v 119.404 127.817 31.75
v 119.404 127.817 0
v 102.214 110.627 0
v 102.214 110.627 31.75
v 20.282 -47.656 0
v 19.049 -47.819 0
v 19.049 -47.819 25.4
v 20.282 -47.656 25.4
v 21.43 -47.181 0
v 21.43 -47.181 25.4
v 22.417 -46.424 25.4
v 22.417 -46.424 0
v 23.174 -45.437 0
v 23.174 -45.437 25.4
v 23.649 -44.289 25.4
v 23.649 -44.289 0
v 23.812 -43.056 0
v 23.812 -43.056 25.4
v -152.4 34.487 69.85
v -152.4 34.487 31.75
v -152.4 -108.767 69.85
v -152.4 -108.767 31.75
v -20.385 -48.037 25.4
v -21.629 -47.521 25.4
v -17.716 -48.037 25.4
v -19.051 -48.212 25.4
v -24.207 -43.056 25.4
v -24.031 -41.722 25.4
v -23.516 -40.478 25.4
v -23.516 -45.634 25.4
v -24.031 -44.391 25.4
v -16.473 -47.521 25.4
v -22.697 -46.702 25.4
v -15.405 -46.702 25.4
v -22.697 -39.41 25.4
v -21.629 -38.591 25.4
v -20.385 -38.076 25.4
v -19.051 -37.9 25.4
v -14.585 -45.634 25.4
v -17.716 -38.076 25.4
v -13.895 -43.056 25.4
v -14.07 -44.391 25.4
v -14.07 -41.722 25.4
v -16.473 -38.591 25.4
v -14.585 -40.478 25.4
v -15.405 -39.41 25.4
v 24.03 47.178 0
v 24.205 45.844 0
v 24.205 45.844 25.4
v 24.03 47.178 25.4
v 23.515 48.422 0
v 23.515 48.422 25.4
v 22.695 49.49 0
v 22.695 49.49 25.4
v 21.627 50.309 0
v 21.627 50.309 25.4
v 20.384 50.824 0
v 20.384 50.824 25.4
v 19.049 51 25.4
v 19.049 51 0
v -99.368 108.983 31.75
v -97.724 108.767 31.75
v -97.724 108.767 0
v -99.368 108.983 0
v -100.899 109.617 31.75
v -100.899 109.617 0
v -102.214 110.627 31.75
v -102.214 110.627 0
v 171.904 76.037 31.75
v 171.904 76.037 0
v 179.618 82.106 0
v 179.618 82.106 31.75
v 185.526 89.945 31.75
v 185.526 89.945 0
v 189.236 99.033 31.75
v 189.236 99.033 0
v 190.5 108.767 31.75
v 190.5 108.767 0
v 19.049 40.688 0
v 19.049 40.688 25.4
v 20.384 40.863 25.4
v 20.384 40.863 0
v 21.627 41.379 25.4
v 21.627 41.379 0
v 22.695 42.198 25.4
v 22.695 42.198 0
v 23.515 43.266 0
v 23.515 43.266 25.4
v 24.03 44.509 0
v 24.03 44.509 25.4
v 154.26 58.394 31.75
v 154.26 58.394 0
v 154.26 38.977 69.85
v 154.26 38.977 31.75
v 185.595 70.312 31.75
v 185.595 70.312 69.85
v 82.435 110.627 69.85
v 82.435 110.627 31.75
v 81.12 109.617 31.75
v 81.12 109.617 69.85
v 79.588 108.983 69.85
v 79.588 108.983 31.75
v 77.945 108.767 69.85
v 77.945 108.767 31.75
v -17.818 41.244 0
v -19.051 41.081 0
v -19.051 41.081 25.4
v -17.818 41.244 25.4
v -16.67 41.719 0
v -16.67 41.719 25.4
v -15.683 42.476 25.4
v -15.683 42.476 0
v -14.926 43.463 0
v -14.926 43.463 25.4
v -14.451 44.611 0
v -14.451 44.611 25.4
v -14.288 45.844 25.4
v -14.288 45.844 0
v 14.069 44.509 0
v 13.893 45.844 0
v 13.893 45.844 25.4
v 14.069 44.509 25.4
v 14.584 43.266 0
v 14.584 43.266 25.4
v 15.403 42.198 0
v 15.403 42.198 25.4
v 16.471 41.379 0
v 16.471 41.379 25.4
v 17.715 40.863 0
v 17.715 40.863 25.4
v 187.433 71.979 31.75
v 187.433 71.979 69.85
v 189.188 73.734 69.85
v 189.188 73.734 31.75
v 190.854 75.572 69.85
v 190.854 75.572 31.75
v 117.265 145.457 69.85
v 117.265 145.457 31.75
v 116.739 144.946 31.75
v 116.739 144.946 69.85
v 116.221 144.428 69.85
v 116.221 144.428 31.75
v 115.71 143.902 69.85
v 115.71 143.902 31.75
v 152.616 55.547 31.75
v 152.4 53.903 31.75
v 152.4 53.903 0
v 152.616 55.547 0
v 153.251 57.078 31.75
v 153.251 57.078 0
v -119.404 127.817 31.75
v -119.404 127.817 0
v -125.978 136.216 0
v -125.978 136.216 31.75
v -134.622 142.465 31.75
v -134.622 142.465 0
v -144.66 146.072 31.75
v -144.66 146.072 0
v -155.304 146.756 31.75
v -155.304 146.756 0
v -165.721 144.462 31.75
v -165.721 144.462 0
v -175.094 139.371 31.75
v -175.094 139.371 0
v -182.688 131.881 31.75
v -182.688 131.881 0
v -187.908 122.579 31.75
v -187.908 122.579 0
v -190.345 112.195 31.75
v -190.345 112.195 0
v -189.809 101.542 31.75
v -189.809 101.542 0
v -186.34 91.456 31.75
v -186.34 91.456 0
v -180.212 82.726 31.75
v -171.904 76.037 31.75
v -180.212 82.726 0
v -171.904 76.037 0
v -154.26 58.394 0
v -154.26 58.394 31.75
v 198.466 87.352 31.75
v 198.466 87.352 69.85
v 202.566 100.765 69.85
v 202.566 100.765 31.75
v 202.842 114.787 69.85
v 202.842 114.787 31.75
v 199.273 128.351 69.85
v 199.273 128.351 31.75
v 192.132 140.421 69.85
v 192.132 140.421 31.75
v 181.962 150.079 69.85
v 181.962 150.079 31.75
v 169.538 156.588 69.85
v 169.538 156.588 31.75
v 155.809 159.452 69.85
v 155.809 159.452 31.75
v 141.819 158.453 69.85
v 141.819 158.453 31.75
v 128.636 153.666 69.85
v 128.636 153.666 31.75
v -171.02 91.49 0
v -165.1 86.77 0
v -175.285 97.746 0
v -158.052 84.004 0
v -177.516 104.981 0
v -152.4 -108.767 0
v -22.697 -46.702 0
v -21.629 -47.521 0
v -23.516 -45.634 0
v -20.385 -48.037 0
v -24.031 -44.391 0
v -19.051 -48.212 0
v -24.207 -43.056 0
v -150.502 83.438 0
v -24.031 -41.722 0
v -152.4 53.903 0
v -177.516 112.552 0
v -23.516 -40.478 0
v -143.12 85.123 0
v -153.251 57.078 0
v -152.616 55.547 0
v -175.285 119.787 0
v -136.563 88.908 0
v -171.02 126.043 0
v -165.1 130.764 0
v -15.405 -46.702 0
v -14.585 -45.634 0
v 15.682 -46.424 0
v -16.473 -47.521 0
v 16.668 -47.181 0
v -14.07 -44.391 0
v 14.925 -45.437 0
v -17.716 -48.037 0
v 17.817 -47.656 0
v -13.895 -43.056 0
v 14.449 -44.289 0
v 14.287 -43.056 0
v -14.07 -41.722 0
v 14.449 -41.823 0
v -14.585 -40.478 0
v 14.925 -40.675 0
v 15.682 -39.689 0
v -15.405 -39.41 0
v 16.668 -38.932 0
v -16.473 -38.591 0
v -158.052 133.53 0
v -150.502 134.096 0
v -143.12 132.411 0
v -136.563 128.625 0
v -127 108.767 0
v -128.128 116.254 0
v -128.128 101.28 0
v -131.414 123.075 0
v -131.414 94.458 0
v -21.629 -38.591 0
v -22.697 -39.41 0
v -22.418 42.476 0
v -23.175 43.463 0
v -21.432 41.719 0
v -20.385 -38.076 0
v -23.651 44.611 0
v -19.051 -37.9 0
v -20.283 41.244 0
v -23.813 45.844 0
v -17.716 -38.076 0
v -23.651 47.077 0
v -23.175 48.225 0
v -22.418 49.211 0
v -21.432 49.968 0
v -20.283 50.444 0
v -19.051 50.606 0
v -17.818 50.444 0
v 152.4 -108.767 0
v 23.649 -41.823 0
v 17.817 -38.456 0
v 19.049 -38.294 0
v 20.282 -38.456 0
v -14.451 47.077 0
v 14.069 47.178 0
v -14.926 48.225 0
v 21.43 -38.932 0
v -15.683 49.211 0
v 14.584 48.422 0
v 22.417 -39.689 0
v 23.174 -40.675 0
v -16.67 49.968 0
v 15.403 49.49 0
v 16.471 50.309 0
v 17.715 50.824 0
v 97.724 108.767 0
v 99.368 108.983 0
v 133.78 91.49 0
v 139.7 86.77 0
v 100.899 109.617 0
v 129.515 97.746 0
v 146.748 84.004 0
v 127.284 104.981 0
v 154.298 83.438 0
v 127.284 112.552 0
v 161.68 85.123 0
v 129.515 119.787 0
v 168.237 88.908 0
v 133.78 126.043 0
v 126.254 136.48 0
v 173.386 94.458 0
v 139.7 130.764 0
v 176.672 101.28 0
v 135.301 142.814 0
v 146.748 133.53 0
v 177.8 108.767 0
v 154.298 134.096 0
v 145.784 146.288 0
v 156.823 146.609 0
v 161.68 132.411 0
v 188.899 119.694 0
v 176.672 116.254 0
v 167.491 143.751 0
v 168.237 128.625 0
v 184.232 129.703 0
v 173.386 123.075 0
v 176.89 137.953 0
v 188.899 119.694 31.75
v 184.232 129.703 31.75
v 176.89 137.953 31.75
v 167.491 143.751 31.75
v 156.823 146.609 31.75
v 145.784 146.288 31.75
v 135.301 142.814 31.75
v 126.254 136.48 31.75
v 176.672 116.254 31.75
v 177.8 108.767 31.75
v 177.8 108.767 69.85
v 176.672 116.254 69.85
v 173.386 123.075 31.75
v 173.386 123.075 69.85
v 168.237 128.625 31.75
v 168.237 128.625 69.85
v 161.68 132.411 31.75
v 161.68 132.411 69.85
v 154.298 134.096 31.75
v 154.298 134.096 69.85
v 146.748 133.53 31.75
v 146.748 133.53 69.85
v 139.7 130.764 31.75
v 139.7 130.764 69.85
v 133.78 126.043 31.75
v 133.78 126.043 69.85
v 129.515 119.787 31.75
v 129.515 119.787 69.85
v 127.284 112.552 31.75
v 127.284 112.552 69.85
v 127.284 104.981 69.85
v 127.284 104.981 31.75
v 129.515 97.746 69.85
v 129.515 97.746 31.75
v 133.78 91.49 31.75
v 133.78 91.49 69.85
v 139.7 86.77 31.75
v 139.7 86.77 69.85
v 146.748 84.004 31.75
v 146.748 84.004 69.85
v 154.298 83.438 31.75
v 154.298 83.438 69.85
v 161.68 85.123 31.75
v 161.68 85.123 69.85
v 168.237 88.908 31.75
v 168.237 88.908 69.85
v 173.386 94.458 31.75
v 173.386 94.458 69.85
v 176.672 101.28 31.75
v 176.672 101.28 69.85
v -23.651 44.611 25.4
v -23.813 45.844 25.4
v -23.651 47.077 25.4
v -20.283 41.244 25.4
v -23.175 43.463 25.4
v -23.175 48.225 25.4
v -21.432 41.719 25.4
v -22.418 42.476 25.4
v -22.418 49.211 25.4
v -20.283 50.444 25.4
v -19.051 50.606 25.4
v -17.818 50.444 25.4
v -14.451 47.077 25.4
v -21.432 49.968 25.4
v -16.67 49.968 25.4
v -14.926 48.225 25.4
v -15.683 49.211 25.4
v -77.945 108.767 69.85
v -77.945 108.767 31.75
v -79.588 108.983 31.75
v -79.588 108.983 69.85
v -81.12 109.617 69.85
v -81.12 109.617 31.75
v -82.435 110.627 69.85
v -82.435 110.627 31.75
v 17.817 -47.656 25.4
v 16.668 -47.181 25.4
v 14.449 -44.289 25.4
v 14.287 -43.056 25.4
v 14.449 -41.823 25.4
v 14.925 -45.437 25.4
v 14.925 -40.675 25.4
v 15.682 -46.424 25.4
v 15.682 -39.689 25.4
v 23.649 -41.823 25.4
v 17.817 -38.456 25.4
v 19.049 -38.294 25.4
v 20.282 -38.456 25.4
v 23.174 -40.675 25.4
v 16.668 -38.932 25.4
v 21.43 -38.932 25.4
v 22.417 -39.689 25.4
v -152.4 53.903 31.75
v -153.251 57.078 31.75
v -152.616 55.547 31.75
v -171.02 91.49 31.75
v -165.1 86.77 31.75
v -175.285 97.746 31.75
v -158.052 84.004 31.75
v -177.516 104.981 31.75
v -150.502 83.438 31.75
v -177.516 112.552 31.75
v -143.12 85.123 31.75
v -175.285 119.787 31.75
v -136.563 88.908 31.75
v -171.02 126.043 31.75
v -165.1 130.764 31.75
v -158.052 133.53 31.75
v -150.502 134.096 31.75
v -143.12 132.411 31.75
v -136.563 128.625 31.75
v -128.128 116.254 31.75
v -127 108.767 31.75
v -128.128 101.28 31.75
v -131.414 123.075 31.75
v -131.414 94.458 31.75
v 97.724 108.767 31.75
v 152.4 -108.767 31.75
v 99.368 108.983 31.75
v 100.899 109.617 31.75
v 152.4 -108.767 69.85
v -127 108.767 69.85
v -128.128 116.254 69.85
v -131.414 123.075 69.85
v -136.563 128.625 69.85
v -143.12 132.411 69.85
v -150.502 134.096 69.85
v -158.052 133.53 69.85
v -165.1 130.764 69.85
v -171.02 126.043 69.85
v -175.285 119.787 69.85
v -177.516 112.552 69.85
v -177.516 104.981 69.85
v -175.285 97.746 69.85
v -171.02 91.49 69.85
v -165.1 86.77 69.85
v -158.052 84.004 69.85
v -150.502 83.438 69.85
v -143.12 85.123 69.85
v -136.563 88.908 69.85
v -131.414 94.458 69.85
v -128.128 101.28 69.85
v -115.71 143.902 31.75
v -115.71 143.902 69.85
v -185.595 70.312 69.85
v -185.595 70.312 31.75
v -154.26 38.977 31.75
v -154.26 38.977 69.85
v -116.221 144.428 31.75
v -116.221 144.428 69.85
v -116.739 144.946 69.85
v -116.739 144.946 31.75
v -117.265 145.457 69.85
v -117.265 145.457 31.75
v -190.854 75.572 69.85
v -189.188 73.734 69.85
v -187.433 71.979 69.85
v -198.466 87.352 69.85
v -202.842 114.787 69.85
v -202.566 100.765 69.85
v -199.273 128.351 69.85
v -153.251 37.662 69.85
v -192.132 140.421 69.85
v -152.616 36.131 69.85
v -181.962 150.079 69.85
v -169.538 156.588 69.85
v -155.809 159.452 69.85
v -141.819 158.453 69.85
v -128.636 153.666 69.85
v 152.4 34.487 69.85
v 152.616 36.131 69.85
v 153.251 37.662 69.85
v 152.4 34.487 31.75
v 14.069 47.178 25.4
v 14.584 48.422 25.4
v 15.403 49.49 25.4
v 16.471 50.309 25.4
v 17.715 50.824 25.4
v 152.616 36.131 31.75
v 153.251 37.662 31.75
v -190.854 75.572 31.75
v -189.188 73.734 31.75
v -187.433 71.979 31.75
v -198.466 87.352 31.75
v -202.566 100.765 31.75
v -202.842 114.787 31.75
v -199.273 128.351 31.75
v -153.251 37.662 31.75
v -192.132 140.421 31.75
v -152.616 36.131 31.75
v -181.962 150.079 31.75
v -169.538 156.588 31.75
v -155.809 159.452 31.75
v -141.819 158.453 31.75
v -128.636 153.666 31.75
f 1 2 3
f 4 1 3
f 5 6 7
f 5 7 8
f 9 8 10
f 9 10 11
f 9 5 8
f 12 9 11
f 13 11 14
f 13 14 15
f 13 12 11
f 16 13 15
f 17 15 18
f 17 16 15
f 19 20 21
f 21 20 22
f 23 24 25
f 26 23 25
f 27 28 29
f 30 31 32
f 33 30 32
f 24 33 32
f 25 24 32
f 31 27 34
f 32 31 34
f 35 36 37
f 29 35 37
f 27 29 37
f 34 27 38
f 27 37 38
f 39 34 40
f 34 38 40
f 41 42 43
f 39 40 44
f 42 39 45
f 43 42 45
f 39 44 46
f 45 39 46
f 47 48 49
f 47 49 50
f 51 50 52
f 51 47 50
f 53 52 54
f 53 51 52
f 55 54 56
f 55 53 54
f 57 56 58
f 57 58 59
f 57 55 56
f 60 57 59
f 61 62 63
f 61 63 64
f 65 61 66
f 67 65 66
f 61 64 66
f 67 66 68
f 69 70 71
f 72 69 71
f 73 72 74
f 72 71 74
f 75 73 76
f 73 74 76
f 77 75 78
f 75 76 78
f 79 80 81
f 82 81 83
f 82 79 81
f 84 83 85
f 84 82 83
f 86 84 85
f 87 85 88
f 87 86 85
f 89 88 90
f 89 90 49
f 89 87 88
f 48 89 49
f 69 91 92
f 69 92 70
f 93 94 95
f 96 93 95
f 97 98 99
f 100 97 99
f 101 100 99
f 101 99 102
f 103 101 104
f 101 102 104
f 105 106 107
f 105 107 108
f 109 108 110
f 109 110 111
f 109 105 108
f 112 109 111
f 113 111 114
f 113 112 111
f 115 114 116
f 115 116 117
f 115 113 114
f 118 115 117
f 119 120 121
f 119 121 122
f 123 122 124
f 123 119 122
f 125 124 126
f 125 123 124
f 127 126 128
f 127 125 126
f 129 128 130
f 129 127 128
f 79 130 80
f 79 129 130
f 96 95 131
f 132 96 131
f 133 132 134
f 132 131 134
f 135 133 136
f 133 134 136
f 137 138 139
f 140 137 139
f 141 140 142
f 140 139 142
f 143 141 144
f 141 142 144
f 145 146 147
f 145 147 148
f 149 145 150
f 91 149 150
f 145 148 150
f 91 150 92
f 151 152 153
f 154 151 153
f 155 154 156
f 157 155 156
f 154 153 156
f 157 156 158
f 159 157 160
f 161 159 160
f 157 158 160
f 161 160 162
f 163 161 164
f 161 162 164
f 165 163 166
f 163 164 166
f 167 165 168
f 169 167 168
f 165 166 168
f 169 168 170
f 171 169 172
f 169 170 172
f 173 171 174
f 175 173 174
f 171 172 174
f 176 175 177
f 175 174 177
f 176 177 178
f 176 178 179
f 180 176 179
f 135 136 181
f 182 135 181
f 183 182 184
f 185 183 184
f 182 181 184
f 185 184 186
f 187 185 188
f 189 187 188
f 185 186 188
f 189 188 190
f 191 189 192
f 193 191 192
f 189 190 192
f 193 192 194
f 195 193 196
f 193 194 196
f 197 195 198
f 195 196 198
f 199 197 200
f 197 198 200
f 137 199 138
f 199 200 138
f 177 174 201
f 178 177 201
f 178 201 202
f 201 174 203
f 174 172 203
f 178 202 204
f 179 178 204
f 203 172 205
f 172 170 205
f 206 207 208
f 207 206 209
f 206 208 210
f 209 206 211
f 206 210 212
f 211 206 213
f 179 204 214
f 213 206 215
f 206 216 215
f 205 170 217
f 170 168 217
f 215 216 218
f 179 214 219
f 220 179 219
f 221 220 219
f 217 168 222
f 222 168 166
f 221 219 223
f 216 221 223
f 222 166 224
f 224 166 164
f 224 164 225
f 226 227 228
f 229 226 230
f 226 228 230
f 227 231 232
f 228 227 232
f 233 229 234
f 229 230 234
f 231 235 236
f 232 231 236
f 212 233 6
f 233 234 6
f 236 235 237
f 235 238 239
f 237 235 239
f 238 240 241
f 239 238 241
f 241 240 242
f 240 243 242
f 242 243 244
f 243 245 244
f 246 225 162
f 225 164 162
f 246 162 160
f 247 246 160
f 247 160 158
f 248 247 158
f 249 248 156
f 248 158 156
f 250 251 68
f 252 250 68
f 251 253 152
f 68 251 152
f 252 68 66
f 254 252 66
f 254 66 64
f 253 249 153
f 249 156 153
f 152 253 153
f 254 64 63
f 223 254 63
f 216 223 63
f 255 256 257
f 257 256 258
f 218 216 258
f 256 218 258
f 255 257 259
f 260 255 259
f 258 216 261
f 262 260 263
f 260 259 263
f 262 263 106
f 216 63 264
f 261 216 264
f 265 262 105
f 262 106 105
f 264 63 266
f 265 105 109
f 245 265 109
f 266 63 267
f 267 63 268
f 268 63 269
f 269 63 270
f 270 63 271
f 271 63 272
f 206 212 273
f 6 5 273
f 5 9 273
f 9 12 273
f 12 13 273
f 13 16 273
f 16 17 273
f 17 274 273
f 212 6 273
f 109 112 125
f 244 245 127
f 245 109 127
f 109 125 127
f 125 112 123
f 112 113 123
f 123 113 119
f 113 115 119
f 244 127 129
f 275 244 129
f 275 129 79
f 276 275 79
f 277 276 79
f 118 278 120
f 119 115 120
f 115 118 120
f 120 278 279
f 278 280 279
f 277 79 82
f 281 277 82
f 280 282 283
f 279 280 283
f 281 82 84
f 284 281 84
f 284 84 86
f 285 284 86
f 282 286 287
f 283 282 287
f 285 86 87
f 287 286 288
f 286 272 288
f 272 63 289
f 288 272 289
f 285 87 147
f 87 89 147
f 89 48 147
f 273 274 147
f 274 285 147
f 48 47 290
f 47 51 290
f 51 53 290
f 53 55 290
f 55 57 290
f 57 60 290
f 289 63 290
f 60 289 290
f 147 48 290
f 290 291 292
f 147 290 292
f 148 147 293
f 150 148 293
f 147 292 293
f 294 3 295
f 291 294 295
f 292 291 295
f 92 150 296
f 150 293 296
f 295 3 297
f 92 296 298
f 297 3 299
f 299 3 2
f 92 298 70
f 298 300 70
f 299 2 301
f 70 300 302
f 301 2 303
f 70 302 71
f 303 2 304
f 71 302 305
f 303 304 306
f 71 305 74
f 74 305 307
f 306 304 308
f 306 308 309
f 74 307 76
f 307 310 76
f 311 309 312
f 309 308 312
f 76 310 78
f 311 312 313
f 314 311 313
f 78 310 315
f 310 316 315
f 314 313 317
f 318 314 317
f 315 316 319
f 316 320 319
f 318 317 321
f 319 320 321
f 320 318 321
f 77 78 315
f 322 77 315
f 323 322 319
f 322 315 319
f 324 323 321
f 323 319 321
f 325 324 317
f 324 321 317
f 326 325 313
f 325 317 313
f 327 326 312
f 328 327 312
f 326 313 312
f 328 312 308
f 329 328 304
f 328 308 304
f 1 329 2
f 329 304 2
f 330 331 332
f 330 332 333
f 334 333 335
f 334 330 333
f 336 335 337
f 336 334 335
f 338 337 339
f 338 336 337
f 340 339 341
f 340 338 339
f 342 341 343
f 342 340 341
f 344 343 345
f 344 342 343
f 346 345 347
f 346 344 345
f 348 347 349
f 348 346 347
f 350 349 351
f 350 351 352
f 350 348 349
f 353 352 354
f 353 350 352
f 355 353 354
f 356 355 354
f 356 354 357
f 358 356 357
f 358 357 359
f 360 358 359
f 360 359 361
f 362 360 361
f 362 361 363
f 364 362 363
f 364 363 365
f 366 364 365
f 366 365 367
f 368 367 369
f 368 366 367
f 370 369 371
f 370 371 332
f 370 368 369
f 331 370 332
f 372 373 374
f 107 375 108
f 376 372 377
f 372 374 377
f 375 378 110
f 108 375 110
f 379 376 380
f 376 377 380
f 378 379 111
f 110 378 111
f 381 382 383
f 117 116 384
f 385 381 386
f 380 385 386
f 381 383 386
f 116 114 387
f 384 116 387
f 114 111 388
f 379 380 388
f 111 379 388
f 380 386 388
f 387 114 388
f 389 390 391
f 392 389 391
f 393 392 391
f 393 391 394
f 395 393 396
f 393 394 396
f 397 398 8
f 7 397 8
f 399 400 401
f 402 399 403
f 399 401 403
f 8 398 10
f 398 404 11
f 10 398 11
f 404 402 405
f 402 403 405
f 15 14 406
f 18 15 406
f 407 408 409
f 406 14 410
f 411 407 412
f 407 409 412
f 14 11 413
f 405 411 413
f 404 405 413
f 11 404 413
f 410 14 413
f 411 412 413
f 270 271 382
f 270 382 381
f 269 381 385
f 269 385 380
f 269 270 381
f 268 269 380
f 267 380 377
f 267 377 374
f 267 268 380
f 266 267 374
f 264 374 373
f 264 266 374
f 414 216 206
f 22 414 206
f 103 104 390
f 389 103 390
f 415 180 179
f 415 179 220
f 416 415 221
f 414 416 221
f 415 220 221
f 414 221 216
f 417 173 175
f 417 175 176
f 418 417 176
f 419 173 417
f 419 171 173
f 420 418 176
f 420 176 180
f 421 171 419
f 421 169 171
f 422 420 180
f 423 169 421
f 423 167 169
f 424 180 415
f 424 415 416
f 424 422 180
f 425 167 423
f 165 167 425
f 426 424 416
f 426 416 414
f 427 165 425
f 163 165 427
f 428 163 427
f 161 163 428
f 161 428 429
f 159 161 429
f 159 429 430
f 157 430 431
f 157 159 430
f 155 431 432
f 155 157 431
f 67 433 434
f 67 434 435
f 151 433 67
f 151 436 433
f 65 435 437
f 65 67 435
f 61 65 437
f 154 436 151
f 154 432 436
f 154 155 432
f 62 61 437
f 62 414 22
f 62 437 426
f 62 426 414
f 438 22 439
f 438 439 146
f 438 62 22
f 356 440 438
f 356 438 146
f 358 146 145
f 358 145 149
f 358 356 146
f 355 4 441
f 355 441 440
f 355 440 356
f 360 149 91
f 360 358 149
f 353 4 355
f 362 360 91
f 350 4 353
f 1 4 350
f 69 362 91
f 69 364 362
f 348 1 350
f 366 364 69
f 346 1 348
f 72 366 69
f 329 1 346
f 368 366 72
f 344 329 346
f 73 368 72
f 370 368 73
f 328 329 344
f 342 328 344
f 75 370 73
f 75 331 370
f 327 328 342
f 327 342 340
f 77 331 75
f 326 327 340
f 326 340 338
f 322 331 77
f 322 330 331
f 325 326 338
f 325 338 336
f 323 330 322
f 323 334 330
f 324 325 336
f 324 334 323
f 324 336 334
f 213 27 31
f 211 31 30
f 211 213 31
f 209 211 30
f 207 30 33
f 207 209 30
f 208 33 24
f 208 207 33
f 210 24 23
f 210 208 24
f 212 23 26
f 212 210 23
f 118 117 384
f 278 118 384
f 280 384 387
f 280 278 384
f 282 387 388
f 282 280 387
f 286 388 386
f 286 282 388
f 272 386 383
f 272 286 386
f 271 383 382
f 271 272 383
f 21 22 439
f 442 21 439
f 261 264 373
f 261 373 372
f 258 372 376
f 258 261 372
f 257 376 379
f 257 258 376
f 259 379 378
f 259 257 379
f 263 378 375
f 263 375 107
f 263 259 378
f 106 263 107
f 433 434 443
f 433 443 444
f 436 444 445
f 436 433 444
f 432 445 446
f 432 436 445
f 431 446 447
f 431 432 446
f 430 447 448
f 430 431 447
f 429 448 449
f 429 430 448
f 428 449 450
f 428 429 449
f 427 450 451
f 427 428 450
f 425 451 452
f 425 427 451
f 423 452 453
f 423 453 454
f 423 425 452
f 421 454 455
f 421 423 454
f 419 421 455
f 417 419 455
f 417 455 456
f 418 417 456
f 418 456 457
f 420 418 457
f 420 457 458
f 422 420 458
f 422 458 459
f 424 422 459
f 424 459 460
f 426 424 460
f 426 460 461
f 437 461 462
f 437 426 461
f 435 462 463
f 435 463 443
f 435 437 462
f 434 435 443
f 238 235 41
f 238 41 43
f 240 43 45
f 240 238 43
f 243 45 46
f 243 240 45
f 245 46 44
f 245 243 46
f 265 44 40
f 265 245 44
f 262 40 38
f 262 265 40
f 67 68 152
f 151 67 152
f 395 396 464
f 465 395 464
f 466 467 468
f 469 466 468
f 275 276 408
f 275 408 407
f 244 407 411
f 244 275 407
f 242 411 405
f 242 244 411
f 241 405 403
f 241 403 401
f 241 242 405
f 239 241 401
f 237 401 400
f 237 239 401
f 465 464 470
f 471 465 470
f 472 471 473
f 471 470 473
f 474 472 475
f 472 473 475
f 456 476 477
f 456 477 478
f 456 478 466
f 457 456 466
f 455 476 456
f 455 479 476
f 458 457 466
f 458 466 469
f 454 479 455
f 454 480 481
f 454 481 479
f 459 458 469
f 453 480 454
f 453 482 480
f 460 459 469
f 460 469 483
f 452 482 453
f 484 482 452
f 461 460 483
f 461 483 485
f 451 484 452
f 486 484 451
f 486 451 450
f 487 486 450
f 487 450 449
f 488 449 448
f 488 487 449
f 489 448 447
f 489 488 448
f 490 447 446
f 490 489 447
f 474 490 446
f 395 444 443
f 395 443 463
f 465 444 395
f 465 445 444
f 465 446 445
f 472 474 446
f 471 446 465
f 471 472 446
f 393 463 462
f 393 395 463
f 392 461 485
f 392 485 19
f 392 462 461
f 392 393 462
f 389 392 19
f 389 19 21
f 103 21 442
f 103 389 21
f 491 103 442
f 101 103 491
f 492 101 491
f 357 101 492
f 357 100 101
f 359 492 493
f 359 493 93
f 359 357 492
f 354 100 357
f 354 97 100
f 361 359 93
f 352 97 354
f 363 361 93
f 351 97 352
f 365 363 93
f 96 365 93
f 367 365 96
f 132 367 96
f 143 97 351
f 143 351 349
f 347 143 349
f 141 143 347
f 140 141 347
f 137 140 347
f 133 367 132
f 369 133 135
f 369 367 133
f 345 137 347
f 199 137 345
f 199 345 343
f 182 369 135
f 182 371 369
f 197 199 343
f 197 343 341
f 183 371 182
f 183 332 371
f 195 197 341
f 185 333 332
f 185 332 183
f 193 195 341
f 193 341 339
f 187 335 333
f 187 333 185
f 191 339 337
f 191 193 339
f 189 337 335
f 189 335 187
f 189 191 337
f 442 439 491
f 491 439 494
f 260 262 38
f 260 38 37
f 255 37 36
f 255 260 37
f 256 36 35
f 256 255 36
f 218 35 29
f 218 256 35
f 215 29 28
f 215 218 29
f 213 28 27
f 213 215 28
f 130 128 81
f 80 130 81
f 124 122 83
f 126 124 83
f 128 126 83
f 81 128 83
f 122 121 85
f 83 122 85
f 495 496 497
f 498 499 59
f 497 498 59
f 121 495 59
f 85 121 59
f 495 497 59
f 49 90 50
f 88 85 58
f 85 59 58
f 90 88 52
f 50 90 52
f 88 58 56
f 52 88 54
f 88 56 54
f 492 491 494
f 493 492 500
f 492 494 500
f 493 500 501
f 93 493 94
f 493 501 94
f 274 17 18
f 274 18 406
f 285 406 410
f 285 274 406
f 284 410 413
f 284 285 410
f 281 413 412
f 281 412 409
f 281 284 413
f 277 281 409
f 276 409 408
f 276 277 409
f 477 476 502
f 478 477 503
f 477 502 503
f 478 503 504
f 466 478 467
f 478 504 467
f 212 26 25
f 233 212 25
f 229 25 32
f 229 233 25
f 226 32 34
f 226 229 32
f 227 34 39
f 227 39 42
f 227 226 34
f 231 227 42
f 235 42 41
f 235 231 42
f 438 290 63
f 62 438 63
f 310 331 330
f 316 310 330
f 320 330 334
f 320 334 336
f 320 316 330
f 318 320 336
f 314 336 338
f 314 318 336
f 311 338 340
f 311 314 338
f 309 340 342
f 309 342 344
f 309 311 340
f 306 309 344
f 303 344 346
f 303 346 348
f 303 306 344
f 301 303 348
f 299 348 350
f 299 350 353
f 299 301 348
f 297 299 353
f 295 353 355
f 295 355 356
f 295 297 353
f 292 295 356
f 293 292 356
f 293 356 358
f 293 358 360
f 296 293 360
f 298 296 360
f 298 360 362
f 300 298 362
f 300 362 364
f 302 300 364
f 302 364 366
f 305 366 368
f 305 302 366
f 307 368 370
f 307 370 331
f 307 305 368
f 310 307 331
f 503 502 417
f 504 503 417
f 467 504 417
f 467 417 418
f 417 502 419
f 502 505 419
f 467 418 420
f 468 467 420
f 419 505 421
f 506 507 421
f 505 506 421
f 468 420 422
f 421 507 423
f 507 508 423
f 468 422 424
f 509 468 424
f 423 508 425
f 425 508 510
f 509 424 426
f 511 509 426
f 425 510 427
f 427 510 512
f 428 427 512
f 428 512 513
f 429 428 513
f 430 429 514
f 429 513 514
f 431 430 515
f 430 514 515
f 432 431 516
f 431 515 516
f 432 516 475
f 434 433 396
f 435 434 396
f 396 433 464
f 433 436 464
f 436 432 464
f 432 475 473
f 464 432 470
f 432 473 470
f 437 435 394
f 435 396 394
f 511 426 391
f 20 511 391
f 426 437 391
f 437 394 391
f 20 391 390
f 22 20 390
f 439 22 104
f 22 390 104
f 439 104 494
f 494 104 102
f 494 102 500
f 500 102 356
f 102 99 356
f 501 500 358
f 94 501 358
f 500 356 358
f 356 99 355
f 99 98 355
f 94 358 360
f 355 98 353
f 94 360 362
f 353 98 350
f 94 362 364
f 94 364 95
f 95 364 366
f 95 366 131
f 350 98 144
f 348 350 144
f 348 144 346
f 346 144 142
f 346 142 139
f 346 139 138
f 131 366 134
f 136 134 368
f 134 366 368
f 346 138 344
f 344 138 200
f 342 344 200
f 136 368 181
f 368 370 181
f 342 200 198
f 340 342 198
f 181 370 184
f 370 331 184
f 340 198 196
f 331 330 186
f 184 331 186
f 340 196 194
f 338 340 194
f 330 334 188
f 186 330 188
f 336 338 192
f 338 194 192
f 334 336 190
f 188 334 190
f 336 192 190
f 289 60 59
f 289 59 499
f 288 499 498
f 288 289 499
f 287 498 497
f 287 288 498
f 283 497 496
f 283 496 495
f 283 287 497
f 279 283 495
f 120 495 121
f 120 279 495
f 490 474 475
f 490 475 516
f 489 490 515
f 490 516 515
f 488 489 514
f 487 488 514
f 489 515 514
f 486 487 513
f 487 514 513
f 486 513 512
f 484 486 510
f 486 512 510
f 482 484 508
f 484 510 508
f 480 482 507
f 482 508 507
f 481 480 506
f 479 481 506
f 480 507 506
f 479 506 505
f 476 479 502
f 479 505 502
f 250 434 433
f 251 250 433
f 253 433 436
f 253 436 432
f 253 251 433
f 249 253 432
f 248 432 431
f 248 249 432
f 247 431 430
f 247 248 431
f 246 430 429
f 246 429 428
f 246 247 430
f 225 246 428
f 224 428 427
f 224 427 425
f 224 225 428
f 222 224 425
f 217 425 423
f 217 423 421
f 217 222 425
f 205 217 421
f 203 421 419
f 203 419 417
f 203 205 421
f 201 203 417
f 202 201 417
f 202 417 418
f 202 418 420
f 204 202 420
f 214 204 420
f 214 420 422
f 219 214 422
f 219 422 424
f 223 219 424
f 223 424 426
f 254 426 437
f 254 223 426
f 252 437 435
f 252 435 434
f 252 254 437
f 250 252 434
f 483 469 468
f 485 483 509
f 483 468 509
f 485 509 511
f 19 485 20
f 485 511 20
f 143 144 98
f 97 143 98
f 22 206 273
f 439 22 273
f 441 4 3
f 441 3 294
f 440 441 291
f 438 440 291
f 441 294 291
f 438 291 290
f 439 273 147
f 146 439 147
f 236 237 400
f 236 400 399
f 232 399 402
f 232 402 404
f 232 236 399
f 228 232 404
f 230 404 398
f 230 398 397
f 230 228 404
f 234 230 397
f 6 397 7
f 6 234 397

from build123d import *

# Parameters (mm, degrees)
F0_R     = 25.4
F1_DEPTH = 31.75
F4_R     = 25.4
F5_DEPTH = 38.1
F7_DEPTH = 25.4


with BuildPart() as f1:
    # F0 (on Top) → F1 (new body)
    with BuildSketch(Plane.XY):
        with BuildLine():
            Line((-152.4, 53.9033839703), (-152.4, -108.7667216295))
            Line((-152.4, -108.7667216295), (152.4, -108.7667216295))
            Line((152.4, -108.7667216295), (152.4, 53.9033839703))
            ThreePointArc((152.4, 53.9033839703), (152.8833649686, 56.3334237658), (154.2598719395, 58.3935120309))
            Line((154.2598719395, 58.3935120309), (171.9035763614, 76.0372164528))
            ThreePointArc((171.9035763614, 76.0372164528), (125.6457900901, 81.6406778321), (119.4044321158, 127.8167216295))
            Line((119.4044321158, 127.8167216295), (102.2143040553, 110.626593569))
            ThreePointArc((102.2143040553, 110.626593569), (100.1542157903, 109.2500865981), (97.7241759947, 108.7667216295))
            Line((97.7241759947, 108.7667216295), (-97.7241759947, 108.7667216295))
            ThreePointArc((-97.7241759947, 108.7667216295), (-100.1542157903, 109.2500865981), (-102.2143040553, 110.626593569))
            Line((-102.2143040553, 110.626593569), (-119.4044321158, 127.8167216295))
            ThreePointArc((-119.4044321158, 127.8167216295), (-115.5982260184, 118.6277272479), (-114.3, 108.7667216295))
            ThreePointArc((-114.3, 108.7667216295), (-125.4592316368, 81.8259532663), (-152.4, 70.6667216295))
            Line((-152.4, 70.6667216295), (-152.4, 53.9033839703))
        make_face()
        with BuildLine():
            ThreePointArc((-171.9035763614, 76.0372164528), (-162.5147380778, 72.0338742907), (-152.4, 70.6667216295))
            ThreePointArc((-152.4, 70.6667216295), (-125.4592316368, 81.8259532663), (-114.3, 108.7667216295))
            ThreePointArc((-114.3, 108.7667216295), (-115.5982260184, 118.6277272479), (-119.4044321158, 127.8167216295))
            ThreePointArc((-119.4044321158, 127.8167216295), (-179.1542099099, 135.8927654269), (-171.9035763614, 76.0372164528))
        make_face()
        with Locations((-152.4, 108.7667216295)):
            Circle(F0_R, mode=Mode.SUBTRACT)
        with BuildLine():
            ThreePointArc((119.4044321158, 127.8167216295), (125.6457900901, 81.6406778321), (171.9035763614, 76.0372164528))
            ThreePointArc((171.9035763614, 76.0372164528), (185.5262453303, 89.9448760687), (190.5, 108.7667216295))
            ThreePointArc((190.5, 108.7667216295), (162.2610056184, 145.5684956111), (119.4044321158, 127.8167216295))
        make_face()
        with Locations((152.4, 108.7667216295)):
            Circle(F0_R, mode=Mode.SUBTRACT)
        with BuildLine():
            ThreePointArc((-154.2598719395, 58.3935120309), (-152.8833649686, 56.3334237658), (-152.4, 53.9033839703))
            Line((-152.4, 53.9033839703), (-152.4, 70.6667216295))
            ThreePointArc((-152.4, 70.6667216295), (-162.5147380778, 72.0338742907), (-171.9035763614, 76.0372164528))
            Line((-171.9035763614, 76.0372164528), (-154.2598719395, 58.3935120309))
        make_face()
    extrude(amount=F1_DEPTH)


with BuildPart() as f2_1:
    # F2: copy of F1
    add(f1.part)


with BuildPart() as f5:
    # F4 (on face) → F5 (new body)
    with BuildSketch(Plane.XY.offset(31.75)):
        with BuildLine():
            Line((-152.4, -108.7667216295), (152.4, -108.7667216295))
            Line((152.4, -108.7667216295), (152.4, 34.487204177))
            ThreePointArc((152.4, 34.487204177), (152.8833649686, 36.9172439725), (154.2598719395, 38.9773322375))
            Line((154.2598719395, 38.9773322375), (185.5948326386, 70.3122929367))
            Line((185.5948326386, 70.3122929367), (190.8544286929, 75.5718889909))
            ThreePointArc((190.8544286929, 75.5718889909), (187.3817017696, 145.6031240231), (117.2645696221, 145.4565231029))
            Line((117.2645696221, 145.4565231029), (115.7101985266, 143.9021520075))
            Line((115.7101985266, 143.9021520075), (82.4346400881, 110.626593569))
            ThreePointArc((82.4346400881, 110.626593569), (80.3745518231, 109.2500865981), (77.9445120276, 108.7667216295))
            Line((77.9445120276, 108.7667216295), (-77.9445120276, 108.7667216295))
            ThreePointArc((-77.9445120276, 108.7667216295), (-80.3745518231, 109.2500865981), (-82.4346400881, 110.626593569))
            Line((-82.4346400881, 110.626593569), (-115.7101985266, 143.9021520075))
            Line((-115.7101985266, 143.9021520075), (-117.2645696221, 145.4565231029))
            ThreePointArc((-117.2645696221, 145.4565231029), (-187.3817017696, 145.6031240231), (-190.8544286929, 75.5718889909))
            Line((-190.8544286929, 75.5718889909), (-185.5948326386, 70.3122929367))
            Line((-185.5948326386, 70.3122929367), (-154.2598719395, 38.9773322375))
            ThreePointArc((-154.2598719395, 38.9773322375), (-152.8833649686, 36.9172439725), (-152.4, 34.487204177))
            Line((-152.4, 34.487204177), (-152.4, -108.7667216295))
        make_face()
        with Locations((-152.4, 108.7667216295)):
            Circle(F4_R, mode=Mode.SUBTRACT)
        with Locations((152.4, 108.7667216295)):
            Circle(F4_R, mode=Mode.SUBTRACT)
        with BuildLine():
            Line((190.8544286929, 75.5718889909), (185.5948326386, 70.3122929367))
            ThreePointArc((185.5948326386, 70.3122929367), (188.3210244843, 72.8456971453), (190.8544286929, 75.5718889909))
        make_face()
        with BuildLine():
            ThreePointArc((-190.8544286929, 75.5718889909), (-188.3210244843, 72.8456971453), (-185.5948326386, 70.3122929367))
            Line((-185.5948326386, 70.3122929367), (-190.8544286929, 75.5718889909))
        make_face()
        with BuildLine():
            Line((115.7101985266, 143.9021520075), (117.2645696221, 145.4565231029))
            ThreePointArc((117.2645696221, 145.4565231029), (116.4789755157, 144.6877461138), (115.7101985266, 143.9021520075))
        make_face()
        with BuildLine():
            ThreePointArc((-115.7101985266, 143.9021520075), (-116.4789755157, 144.6877461138), (-117.2645696221, 145.4565231029))
            Line((-117.2645696221, 145.4565231029), (-115.7101985266, 143.9021520075))
        make_face()
    extrude(amount=F5_DEPTH)


with BuildPart() as f1_1:
    add(f1.part)

    # F6 (on Top) → F7 (cut)
    with BuildSketch(Plane.XY):
        with BuildLine():
            ThreePointArc((-19.050831298, -48.2122973633), (-15.4048473129, -46.7020813484), (-13.894631298, -43.0560973633))
            Line((-13.894631298, -43.0560973633), (-19.050831298, -43.0560973633))
            Line((-19.050831298, -43.0560973633), (-19.050831298, -48.2122973633))
        make_face()
        with BuildLine():
            ThreePointArc((-24.207031298, -43.0560973633), (-22.6968152832, -46.7020813484), (-19.050831298, -48.2122973633))
            Line((-19.050831298, -48.2122973633), (-19.050831298, -43.0560973633))
            Line((-19.050831298, -43.0560973633), (-24.207031298, -43.0560973633))
        make_face()
        with BuildLine():
            Line((-24.207031298, -43.0560973633), (-19.050831298, -43.0560973633))
            Line((-19.050831298, -43.0560973633), (-19.050831298, -37.8998973633))
            ThreePointArc((-19.050831298, -37.8998973633), (-22.6968152832, -39.4101133781), (-24.207031298, -43.0560973633))
        make_face()
        with BuildLine():
            Line((-19.050831298, -43.0560973633), (-13.894631298, -43.0560973633))
            ThreePointArc((-13.894631298, -43.0560973633), (-15.4048473129, -39.4101133781), (-19.050831298, -37.8998973633))
            Line((-19.050831298, -37.8998973633), (-19.050831298, -43.0560973633))
        make_face()
        with BuildLine():
            ThreePointArc((19.049168702, -47.8185973633), (22.4167647474, -46.4236934087), (23.811668702, -43.0560973633))
            Line((23.811668702, -43.0560973633), (19.049168702, -43.0560973633))
            Line((19.049168702, -43.0560973633), (19.049168702, -47.8185973633))
        make_face()
        with BuildLine():
            Line((19.049168702, -47.8185973633), (19.049168702, -43.0560973633))
            Line((19.049168702, -43.0560973633), (14.286668702, -43.0560973633))
            ThreePointArc((14.286668702, -43.0560973633), (15.6815726566, -46.4236934087), (19.049168702, -47.8185973633))
        make_face()
        with BuildLine():
            Line((14.286668702, -43.0560973633), (19.049168702, -43.0560973633))
            Line((19.049168702, -43.0560973633), (19.049168702, -38.2935973633))
            ThreePointArc((19.049168702, -38.2935973633), (15.6815726566, -39.6885013179), (14.286668702, -43.0560973633))
        make_face()
        with BuildLine():
            Line((19.049168702, -43.0560973633), (23.811668702, -43.0560973633))
            ThreePointArc((23.811668702, -43.0560973633), (22.4167647474, -39.6885013179), (19.049168702, -38.2935973633))
            Line((19.049168702, -38.2935973633), (19.049168702, -43.0560973633))
        make_face()
        with BuildLine():
            Line((19.049168702, 40.6877026367), (19.049168702, 45.8439026367))
            Line((19.049168702, 45.8439026367), (13.892968702, 45.8439026367))
            ThreePointArc((13.892968702, 45.8439026367), (15.4031847168, 42.1979186516), (19.049168702, 40.6877026367))
        make_face()
        with BuildLine():
            Line((19.049168702, 45.8439026367), (19.049168702, 51.0001026367))
            ThreePointArc((19.049168702, 51.0001026367), (15.4031847168, 49.4898866219), (13.892968702, 45.8439026367))
            Line((13.892968702, 45.8439026367), (19.049168702, 45.8439026367))
        make_face()
        with BuildLine():
            Line((19.049168702, 45.8439026367), (24.205368702, 45.8439026367))
            ThreePointArc((24.205368702, 45.8439026367), (22.6951526871, 49.4898866219), (19.049168702, 51.0001026367))
            Line((19.049168702, 51.0001026367), (19.049168702, 45.8439026367))
        make_face()
        with BuildLine():
            ThreePointArc((19.049168702, 40.6877026367), (22.6951526871, 42.1979186516), (24.205368702, 45.8439026367))
            Line((24.205368702, 45.8439026367), (19.049168702, 45.8439026367))
            Line((19.049168702, 45.8439026367), (19.049168702, 40.6877026367))
        make_face()
        with BuildLine():
            Line((-14.288331298, 45.8439026367), (-19.050831298, 45.8439026367))
            Line((-19.050831298, 45.8439026367), (-19.050831298, 41.0814026367))
            ThreePointArc((-19.050831298, 41.0814026367), (-15.6832352526, 42.4763065913), (-14.288331298, 45.8439026367))
        make_face()
        with BuildLine():
            ThreePointArc((-14.288331298, 45.8439026367), (-15.6832352526, 49.2114986821), (-19.050831298, 50.6064026367))
            Line((-19.050831298, 50.6064026367), (-19.050831298, 45.8439026367))
            Line((-19.050831298, 45.8439026367), (-14.288331298, 45.8439026367))
        make_face()
        with BuildLine():
            Line((-19.050831298, 45.8439026367), (-19.050831298, 50.6064026367))
            ThreePointArc((-19.050831298, 50.6064026367), (-22.4184273434, 49.2114986821), (-23.813331298, 45.8439026367))
            Line((-23.813331298, 45.8439026367), (-19.050831298, 45.8439026367))
        make_face()
        with BuildLine():
            Line((-19.050831298, 41.0814026367), (-19.050831298, 45.8439026367))
            Line((-19.050831298, 45.8439026367), (-23.813331298, 45.8439026367))
            ThreePointArc((-23.813331298, 45.8439026367), (-22.4184273434, 42.4763065913), (-19.050831298, 41.0814026367))
        make_face()
    extrude(amount=F7_DEPTH, mode=Mode.SUBTRACT)


solid = Compound([f5.part, f1_1.part])
